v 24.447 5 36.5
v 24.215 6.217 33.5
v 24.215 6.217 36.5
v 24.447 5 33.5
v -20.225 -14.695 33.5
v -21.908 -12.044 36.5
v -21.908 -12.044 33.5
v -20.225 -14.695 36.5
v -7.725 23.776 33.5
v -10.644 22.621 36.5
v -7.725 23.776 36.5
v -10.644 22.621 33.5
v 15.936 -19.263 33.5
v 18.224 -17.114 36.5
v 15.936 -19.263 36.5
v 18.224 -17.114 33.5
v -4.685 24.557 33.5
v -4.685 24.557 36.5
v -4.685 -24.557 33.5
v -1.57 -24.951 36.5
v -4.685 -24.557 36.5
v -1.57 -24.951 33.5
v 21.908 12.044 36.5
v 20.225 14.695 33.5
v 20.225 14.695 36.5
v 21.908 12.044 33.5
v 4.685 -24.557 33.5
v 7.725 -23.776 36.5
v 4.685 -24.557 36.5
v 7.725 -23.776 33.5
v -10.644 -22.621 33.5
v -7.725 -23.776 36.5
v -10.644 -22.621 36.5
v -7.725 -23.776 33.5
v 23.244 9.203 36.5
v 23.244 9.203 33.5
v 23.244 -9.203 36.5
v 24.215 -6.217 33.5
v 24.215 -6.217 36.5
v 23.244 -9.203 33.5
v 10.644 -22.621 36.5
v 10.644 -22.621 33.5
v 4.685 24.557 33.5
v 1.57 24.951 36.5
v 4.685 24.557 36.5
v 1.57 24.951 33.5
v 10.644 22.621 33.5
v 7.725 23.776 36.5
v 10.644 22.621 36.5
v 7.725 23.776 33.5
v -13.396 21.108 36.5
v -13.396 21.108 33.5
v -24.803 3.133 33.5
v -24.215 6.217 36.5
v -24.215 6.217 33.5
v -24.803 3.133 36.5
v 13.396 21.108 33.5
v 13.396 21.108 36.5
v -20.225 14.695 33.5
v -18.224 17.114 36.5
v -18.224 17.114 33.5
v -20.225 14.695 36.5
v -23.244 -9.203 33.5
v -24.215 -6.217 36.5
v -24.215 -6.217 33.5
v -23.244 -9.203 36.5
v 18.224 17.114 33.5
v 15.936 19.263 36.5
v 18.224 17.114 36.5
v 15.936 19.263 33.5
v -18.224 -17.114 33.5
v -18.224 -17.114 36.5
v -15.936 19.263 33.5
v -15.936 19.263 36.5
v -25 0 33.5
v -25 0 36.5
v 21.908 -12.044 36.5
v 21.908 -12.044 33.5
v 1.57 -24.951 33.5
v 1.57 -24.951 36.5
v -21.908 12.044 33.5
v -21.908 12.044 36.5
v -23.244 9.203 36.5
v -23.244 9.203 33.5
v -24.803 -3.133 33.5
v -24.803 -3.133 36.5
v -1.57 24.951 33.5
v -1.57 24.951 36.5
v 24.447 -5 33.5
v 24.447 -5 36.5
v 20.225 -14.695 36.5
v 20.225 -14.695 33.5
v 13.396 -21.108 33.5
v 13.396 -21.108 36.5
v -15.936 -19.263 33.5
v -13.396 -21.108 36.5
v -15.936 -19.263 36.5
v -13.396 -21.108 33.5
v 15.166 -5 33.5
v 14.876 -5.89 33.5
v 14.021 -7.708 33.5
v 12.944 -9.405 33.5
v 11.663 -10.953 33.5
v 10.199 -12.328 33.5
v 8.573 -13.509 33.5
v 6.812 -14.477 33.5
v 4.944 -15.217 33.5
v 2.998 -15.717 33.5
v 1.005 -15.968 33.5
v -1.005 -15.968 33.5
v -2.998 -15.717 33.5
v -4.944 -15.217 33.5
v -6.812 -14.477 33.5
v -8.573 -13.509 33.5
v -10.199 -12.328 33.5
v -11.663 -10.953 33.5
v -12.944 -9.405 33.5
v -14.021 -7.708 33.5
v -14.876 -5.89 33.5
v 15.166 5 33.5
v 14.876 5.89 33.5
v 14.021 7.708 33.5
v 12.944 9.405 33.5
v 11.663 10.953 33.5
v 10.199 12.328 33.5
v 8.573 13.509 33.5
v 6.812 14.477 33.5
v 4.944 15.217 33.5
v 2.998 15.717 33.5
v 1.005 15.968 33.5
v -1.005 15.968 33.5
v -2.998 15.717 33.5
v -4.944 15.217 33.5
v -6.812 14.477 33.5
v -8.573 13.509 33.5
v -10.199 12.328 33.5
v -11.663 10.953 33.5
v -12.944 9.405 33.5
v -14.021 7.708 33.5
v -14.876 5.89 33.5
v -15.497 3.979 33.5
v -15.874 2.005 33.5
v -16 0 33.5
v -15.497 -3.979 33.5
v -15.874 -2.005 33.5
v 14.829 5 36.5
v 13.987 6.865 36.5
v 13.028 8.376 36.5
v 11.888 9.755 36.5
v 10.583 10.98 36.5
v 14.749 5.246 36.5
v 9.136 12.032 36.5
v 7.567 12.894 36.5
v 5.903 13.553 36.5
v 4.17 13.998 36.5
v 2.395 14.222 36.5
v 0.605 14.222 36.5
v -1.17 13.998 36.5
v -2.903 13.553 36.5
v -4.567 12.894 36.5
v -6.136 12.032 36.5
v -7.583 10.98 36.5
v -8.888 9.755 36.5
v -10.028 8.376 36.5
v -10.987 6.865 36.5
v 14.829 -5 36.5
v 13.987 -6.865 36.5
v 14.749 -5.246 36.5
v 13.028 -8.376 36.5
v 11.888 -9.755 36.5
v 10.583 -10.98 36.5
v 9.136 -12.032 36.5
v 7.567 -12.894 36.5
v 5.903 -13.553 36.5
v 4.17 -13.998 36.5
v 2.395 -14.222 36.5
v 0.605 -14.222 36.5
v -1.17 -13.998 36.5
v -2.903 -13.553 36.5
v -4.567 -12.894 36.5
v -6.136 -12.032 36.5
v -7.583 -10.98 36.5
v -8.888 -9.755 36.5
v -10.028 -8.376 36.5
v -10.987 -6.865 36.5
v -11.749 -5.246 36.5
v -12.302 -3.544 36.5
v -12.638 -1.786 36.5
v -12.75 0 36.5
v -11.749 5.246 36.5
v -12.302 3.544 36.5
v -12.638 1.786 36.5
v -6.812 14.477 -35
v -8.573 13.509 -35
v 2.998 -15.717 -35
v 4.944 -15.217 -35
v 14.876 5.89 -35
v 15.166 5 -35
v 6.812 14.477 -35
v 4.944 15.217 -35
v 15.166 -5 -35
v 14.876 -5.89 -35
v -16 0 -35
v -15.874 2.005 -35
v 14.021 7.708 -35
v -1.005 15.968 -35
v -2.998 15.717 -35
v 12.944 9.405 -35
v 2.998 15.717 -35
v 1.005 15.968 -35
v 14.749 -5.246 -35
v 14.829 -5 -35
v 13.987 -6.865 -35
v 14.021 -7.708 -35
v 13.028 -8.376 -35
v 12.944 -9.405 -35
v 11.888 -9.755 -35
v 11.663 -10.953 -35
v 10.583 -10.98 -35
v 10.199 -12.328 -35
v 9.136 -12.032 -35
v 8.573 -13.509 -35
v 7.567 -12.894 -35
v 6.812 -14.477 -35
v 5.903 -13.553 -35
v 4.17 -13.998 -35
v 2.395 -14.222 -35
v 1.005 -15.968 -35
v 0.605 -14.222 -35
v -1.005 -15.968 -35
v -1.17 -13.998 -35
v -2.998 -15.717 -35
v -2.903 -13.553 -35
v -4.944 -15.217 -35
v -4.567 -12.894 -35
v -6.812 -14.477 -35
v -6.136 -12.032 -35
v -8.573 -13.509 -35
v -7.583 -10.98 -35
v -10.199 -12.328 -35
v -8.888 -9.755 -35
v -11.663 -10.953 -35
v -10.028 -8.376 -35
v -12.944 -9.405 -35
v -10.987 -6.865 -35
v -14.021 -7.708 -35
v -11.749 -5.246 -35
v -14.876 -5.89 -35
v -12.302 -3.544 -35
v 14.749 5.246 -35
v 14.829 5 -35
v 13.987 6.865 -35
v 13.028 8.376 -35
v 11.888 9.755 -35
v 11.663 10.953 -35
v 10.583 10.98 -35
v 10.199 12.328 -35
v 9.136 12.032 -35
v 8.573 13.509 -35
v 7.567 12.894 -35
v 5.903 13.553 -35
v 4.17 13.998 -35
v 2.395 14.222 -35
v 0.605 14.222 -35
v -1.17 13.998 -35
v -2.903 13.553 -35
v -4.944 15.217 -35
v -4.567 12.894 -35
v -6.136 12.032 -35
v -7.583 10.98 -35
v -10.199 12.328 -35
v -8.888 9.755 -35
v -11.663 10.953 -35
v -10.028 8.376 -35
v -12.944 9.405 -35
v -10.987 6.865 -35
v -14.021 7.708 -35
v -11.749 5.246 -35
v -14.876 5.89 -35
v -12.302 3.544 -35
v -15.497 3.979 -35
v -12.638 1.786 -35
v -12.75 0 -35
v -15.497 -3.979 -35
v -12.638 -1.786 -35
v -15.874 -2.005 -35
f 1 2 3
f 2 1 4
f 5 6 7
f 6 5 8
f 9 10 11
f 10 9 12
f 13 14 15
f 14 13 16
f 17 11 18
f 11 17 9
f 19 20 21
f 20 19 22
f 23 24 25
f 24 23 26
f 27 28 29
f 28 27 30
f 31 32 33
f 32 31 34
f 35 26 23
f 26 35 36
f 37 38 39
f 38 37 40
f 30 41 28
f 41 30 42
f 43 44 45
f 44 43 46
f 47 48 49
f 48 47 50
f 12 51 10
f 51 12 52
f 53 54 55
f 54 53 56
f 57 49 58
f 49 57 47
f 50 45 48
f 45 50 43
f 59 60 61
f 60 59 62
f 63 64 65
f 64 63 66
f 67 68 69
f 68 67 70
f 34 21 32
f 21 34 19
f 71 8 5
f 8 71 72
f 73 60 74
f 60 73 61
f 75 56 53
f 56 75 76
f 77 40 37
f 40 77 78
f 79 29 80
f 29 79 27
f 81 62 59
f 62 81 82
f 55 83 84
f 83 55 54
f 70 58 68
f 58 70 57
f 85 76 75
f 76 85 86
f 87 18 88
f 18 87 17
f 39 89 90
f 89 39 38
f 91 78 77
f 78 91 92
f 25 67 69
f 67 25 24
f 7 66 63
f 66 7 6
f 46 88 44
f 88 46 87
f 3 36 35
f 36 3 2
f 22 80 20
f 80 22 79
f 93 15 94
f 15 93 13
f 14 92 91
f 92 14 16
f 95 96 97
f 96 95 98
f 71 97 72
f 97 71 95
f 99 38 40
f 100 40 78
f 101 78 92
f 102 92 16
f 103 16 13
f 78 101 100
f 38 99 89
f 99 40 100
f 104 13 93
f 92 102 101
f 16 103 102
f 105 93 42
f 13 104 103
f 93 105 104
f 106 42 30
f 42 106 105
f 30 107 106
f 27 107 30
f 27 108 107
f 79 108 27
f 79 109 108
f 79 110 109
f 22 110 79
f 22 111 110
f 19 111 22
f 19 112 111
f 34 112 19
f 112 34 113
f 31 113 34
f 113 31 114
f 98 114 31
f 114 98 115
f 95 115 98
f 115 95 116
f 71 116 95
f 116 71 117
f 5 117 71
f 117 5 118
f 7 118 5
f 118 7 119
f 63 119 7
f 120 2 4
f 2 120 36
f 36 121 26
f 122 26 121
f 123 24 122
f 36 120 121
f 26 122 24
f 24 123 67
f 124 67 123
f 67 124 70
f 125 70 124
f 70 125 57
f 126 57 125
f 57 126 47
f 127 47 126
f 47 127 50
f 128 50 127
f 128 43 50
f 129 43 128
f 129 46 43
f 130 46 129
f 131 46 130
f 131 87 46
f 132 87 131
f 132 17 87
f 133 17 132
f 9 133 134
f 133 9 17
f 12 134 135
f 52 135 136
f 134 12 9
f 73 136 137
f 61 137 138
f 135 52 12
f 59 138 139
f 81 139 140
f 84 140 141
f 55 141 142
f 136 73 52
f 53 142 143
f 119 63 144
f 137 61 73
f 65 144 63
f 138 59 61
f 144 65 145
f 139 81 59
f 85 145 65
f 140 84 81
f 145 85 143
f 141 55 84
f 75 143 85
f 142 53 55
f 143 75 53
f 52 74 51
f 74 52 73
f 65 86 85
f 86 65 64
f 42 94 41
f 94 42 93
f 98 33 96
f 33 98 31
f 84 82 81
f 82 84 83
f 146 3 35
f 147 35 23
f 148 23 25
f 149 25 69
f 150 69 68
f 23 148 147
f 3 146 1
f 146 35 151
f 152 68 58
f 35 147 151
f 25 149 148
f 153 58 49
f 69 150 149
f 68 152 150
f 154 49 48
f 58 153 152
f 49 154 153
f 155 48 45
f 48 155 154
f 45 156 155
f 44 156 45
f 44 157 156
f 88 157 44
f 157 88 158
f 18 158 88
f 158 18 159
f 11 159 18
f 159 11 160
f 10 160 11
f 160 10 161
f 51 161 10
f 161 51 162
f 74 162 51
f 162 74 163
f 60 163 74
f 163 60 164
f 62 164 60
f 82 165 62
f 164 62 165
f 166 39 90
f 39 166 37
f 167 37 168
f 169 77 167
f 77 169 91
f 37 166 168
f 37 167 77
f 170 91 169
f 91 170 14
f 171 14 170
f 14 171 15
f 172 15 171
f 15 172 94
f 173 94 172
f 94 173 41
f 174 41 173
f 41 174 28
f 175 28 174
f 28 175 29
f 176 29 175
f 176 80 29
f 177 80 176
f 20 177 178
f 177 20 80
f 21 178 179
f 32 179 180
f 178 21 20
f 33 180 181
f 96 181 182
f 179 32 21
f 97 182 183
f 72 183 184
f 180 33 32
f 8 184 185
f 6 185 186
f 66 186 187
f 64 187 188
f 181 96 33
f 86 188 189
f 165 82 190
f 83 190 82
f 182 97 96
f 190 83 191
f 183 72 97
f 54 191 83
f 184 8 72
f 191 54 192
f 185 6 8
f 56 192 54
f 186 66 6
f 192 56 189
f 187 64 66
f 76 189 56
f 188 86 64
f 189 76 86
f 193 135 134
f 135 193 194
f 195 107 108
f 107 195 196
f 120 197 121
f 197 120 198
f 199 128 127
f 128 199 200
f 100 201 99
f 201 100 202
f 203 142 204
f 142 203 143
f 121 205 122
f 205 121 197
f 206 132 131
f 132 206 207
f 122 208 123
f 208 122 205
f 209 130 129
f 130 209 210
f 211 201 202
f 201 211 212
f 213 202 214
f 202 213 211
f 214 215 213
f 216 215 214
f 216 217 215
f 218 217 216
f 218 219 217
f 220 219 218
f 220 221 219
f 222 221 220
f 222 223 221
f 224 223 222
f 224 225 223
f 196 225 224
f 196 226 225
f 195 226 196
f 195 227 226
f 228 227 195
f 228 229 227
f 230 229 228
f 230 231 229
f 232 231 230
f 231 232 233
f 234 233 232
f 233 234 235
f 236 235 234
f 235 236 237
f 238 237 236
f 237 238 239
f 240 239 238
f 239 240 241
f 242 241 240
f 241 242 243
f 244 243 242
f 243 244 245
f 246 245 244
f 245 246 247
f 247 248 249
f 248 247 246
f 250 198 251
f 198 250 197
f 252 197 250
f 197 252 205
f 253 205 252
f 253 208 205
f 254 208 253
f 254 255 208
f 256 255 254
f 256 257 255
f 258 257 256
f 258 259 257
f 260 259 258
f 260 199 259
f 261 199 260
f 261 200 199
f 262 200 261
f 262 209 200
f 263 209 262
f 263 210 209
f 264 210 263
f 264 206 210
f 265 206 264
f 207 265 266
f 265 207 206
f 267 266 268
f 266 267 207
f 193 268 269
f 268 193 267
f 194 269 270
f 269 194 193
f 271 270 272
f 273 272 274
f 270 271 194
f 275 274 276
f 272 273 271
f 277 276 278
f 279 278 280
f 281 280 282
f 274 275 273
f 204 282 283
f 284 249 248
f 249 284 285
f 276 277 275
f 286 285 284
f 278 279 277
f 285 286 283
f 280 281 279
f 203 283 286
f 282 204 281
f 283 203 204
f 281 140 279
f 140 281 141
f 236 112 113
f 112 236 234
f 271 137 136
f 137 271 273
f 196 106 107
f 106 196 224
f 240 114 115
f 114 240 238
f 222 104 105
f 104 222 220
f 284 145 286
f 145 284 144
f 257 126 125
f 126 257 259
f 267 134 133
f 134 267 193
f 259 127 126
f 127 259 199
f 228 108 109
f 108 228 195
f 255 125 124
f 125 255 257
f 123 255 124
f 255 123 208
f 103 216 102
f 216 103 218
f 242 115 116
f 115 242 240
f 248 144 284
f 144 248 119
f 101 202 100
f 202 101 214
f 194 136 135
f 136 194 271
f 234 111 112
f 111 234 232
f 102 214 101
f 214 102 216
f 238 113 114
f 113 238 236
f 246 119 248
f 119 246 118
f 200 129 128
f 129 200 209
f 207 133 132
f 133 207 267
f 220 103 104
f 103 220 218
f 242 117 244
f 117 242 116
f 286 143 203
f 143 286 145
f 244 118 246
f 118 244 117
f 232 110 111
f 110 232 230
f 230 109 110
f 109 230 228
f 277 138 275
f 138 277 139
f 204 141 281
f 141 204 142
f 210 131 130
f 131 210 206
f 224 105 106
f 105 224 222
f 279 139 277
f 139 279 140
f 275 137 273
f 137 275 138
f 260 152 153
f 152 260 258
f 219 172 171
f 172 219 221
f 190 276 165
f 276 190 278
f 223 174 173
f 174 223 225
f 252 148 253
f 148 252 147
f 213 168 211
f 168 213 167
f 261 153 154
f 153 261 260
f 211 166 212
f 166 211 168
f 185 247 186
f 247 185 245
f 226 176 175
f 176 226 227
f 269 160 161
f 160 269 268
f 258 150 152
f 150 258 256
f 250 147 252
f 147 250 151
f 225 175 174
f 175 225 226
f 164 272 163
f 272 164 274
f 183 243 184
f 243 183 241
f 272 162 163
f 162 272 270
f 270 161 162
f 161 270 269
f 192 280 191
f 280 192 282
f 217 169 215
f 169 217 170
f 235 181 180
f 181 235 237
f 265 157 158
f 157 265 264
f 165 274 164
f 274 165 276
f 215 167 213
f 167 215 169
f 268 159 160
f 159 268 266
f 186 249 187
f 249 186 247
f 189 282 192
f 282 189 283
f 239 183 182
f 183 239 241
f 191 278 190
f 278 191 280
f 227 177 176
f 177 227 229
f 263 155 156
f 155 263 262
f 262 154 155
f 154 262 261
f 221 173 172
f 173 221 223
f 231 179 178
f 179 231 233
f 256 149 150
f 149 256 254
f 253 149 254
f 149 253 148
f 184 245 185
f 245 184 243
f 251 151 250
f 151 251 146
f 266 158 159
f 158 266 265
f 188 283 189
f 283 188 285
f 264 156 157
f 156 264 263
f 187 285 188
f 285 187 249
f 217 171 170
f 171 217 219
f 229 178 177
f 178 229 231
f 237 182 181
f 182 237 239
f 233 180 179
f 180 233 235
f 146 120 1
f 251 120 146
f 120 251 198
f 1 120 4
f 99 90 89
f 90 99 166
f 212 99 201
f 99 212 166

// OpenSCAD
$fn=50;
//color("red") cylinder(h=100,d=28, center=true);
//translate([0,0,10]) cylinder(h=10,r=10, center=true);

difference(){
union(){
translate([0,0,35])cylinder(h=3,d=50, center=true);
cylinder(h=70,d=32, center=true);
}
union(){
translate([3.0/2,0,0])cylinder(h=100,d=28.5, center=true);
translate([20,0,0])cube([20,10,100], center=true);
}
}
